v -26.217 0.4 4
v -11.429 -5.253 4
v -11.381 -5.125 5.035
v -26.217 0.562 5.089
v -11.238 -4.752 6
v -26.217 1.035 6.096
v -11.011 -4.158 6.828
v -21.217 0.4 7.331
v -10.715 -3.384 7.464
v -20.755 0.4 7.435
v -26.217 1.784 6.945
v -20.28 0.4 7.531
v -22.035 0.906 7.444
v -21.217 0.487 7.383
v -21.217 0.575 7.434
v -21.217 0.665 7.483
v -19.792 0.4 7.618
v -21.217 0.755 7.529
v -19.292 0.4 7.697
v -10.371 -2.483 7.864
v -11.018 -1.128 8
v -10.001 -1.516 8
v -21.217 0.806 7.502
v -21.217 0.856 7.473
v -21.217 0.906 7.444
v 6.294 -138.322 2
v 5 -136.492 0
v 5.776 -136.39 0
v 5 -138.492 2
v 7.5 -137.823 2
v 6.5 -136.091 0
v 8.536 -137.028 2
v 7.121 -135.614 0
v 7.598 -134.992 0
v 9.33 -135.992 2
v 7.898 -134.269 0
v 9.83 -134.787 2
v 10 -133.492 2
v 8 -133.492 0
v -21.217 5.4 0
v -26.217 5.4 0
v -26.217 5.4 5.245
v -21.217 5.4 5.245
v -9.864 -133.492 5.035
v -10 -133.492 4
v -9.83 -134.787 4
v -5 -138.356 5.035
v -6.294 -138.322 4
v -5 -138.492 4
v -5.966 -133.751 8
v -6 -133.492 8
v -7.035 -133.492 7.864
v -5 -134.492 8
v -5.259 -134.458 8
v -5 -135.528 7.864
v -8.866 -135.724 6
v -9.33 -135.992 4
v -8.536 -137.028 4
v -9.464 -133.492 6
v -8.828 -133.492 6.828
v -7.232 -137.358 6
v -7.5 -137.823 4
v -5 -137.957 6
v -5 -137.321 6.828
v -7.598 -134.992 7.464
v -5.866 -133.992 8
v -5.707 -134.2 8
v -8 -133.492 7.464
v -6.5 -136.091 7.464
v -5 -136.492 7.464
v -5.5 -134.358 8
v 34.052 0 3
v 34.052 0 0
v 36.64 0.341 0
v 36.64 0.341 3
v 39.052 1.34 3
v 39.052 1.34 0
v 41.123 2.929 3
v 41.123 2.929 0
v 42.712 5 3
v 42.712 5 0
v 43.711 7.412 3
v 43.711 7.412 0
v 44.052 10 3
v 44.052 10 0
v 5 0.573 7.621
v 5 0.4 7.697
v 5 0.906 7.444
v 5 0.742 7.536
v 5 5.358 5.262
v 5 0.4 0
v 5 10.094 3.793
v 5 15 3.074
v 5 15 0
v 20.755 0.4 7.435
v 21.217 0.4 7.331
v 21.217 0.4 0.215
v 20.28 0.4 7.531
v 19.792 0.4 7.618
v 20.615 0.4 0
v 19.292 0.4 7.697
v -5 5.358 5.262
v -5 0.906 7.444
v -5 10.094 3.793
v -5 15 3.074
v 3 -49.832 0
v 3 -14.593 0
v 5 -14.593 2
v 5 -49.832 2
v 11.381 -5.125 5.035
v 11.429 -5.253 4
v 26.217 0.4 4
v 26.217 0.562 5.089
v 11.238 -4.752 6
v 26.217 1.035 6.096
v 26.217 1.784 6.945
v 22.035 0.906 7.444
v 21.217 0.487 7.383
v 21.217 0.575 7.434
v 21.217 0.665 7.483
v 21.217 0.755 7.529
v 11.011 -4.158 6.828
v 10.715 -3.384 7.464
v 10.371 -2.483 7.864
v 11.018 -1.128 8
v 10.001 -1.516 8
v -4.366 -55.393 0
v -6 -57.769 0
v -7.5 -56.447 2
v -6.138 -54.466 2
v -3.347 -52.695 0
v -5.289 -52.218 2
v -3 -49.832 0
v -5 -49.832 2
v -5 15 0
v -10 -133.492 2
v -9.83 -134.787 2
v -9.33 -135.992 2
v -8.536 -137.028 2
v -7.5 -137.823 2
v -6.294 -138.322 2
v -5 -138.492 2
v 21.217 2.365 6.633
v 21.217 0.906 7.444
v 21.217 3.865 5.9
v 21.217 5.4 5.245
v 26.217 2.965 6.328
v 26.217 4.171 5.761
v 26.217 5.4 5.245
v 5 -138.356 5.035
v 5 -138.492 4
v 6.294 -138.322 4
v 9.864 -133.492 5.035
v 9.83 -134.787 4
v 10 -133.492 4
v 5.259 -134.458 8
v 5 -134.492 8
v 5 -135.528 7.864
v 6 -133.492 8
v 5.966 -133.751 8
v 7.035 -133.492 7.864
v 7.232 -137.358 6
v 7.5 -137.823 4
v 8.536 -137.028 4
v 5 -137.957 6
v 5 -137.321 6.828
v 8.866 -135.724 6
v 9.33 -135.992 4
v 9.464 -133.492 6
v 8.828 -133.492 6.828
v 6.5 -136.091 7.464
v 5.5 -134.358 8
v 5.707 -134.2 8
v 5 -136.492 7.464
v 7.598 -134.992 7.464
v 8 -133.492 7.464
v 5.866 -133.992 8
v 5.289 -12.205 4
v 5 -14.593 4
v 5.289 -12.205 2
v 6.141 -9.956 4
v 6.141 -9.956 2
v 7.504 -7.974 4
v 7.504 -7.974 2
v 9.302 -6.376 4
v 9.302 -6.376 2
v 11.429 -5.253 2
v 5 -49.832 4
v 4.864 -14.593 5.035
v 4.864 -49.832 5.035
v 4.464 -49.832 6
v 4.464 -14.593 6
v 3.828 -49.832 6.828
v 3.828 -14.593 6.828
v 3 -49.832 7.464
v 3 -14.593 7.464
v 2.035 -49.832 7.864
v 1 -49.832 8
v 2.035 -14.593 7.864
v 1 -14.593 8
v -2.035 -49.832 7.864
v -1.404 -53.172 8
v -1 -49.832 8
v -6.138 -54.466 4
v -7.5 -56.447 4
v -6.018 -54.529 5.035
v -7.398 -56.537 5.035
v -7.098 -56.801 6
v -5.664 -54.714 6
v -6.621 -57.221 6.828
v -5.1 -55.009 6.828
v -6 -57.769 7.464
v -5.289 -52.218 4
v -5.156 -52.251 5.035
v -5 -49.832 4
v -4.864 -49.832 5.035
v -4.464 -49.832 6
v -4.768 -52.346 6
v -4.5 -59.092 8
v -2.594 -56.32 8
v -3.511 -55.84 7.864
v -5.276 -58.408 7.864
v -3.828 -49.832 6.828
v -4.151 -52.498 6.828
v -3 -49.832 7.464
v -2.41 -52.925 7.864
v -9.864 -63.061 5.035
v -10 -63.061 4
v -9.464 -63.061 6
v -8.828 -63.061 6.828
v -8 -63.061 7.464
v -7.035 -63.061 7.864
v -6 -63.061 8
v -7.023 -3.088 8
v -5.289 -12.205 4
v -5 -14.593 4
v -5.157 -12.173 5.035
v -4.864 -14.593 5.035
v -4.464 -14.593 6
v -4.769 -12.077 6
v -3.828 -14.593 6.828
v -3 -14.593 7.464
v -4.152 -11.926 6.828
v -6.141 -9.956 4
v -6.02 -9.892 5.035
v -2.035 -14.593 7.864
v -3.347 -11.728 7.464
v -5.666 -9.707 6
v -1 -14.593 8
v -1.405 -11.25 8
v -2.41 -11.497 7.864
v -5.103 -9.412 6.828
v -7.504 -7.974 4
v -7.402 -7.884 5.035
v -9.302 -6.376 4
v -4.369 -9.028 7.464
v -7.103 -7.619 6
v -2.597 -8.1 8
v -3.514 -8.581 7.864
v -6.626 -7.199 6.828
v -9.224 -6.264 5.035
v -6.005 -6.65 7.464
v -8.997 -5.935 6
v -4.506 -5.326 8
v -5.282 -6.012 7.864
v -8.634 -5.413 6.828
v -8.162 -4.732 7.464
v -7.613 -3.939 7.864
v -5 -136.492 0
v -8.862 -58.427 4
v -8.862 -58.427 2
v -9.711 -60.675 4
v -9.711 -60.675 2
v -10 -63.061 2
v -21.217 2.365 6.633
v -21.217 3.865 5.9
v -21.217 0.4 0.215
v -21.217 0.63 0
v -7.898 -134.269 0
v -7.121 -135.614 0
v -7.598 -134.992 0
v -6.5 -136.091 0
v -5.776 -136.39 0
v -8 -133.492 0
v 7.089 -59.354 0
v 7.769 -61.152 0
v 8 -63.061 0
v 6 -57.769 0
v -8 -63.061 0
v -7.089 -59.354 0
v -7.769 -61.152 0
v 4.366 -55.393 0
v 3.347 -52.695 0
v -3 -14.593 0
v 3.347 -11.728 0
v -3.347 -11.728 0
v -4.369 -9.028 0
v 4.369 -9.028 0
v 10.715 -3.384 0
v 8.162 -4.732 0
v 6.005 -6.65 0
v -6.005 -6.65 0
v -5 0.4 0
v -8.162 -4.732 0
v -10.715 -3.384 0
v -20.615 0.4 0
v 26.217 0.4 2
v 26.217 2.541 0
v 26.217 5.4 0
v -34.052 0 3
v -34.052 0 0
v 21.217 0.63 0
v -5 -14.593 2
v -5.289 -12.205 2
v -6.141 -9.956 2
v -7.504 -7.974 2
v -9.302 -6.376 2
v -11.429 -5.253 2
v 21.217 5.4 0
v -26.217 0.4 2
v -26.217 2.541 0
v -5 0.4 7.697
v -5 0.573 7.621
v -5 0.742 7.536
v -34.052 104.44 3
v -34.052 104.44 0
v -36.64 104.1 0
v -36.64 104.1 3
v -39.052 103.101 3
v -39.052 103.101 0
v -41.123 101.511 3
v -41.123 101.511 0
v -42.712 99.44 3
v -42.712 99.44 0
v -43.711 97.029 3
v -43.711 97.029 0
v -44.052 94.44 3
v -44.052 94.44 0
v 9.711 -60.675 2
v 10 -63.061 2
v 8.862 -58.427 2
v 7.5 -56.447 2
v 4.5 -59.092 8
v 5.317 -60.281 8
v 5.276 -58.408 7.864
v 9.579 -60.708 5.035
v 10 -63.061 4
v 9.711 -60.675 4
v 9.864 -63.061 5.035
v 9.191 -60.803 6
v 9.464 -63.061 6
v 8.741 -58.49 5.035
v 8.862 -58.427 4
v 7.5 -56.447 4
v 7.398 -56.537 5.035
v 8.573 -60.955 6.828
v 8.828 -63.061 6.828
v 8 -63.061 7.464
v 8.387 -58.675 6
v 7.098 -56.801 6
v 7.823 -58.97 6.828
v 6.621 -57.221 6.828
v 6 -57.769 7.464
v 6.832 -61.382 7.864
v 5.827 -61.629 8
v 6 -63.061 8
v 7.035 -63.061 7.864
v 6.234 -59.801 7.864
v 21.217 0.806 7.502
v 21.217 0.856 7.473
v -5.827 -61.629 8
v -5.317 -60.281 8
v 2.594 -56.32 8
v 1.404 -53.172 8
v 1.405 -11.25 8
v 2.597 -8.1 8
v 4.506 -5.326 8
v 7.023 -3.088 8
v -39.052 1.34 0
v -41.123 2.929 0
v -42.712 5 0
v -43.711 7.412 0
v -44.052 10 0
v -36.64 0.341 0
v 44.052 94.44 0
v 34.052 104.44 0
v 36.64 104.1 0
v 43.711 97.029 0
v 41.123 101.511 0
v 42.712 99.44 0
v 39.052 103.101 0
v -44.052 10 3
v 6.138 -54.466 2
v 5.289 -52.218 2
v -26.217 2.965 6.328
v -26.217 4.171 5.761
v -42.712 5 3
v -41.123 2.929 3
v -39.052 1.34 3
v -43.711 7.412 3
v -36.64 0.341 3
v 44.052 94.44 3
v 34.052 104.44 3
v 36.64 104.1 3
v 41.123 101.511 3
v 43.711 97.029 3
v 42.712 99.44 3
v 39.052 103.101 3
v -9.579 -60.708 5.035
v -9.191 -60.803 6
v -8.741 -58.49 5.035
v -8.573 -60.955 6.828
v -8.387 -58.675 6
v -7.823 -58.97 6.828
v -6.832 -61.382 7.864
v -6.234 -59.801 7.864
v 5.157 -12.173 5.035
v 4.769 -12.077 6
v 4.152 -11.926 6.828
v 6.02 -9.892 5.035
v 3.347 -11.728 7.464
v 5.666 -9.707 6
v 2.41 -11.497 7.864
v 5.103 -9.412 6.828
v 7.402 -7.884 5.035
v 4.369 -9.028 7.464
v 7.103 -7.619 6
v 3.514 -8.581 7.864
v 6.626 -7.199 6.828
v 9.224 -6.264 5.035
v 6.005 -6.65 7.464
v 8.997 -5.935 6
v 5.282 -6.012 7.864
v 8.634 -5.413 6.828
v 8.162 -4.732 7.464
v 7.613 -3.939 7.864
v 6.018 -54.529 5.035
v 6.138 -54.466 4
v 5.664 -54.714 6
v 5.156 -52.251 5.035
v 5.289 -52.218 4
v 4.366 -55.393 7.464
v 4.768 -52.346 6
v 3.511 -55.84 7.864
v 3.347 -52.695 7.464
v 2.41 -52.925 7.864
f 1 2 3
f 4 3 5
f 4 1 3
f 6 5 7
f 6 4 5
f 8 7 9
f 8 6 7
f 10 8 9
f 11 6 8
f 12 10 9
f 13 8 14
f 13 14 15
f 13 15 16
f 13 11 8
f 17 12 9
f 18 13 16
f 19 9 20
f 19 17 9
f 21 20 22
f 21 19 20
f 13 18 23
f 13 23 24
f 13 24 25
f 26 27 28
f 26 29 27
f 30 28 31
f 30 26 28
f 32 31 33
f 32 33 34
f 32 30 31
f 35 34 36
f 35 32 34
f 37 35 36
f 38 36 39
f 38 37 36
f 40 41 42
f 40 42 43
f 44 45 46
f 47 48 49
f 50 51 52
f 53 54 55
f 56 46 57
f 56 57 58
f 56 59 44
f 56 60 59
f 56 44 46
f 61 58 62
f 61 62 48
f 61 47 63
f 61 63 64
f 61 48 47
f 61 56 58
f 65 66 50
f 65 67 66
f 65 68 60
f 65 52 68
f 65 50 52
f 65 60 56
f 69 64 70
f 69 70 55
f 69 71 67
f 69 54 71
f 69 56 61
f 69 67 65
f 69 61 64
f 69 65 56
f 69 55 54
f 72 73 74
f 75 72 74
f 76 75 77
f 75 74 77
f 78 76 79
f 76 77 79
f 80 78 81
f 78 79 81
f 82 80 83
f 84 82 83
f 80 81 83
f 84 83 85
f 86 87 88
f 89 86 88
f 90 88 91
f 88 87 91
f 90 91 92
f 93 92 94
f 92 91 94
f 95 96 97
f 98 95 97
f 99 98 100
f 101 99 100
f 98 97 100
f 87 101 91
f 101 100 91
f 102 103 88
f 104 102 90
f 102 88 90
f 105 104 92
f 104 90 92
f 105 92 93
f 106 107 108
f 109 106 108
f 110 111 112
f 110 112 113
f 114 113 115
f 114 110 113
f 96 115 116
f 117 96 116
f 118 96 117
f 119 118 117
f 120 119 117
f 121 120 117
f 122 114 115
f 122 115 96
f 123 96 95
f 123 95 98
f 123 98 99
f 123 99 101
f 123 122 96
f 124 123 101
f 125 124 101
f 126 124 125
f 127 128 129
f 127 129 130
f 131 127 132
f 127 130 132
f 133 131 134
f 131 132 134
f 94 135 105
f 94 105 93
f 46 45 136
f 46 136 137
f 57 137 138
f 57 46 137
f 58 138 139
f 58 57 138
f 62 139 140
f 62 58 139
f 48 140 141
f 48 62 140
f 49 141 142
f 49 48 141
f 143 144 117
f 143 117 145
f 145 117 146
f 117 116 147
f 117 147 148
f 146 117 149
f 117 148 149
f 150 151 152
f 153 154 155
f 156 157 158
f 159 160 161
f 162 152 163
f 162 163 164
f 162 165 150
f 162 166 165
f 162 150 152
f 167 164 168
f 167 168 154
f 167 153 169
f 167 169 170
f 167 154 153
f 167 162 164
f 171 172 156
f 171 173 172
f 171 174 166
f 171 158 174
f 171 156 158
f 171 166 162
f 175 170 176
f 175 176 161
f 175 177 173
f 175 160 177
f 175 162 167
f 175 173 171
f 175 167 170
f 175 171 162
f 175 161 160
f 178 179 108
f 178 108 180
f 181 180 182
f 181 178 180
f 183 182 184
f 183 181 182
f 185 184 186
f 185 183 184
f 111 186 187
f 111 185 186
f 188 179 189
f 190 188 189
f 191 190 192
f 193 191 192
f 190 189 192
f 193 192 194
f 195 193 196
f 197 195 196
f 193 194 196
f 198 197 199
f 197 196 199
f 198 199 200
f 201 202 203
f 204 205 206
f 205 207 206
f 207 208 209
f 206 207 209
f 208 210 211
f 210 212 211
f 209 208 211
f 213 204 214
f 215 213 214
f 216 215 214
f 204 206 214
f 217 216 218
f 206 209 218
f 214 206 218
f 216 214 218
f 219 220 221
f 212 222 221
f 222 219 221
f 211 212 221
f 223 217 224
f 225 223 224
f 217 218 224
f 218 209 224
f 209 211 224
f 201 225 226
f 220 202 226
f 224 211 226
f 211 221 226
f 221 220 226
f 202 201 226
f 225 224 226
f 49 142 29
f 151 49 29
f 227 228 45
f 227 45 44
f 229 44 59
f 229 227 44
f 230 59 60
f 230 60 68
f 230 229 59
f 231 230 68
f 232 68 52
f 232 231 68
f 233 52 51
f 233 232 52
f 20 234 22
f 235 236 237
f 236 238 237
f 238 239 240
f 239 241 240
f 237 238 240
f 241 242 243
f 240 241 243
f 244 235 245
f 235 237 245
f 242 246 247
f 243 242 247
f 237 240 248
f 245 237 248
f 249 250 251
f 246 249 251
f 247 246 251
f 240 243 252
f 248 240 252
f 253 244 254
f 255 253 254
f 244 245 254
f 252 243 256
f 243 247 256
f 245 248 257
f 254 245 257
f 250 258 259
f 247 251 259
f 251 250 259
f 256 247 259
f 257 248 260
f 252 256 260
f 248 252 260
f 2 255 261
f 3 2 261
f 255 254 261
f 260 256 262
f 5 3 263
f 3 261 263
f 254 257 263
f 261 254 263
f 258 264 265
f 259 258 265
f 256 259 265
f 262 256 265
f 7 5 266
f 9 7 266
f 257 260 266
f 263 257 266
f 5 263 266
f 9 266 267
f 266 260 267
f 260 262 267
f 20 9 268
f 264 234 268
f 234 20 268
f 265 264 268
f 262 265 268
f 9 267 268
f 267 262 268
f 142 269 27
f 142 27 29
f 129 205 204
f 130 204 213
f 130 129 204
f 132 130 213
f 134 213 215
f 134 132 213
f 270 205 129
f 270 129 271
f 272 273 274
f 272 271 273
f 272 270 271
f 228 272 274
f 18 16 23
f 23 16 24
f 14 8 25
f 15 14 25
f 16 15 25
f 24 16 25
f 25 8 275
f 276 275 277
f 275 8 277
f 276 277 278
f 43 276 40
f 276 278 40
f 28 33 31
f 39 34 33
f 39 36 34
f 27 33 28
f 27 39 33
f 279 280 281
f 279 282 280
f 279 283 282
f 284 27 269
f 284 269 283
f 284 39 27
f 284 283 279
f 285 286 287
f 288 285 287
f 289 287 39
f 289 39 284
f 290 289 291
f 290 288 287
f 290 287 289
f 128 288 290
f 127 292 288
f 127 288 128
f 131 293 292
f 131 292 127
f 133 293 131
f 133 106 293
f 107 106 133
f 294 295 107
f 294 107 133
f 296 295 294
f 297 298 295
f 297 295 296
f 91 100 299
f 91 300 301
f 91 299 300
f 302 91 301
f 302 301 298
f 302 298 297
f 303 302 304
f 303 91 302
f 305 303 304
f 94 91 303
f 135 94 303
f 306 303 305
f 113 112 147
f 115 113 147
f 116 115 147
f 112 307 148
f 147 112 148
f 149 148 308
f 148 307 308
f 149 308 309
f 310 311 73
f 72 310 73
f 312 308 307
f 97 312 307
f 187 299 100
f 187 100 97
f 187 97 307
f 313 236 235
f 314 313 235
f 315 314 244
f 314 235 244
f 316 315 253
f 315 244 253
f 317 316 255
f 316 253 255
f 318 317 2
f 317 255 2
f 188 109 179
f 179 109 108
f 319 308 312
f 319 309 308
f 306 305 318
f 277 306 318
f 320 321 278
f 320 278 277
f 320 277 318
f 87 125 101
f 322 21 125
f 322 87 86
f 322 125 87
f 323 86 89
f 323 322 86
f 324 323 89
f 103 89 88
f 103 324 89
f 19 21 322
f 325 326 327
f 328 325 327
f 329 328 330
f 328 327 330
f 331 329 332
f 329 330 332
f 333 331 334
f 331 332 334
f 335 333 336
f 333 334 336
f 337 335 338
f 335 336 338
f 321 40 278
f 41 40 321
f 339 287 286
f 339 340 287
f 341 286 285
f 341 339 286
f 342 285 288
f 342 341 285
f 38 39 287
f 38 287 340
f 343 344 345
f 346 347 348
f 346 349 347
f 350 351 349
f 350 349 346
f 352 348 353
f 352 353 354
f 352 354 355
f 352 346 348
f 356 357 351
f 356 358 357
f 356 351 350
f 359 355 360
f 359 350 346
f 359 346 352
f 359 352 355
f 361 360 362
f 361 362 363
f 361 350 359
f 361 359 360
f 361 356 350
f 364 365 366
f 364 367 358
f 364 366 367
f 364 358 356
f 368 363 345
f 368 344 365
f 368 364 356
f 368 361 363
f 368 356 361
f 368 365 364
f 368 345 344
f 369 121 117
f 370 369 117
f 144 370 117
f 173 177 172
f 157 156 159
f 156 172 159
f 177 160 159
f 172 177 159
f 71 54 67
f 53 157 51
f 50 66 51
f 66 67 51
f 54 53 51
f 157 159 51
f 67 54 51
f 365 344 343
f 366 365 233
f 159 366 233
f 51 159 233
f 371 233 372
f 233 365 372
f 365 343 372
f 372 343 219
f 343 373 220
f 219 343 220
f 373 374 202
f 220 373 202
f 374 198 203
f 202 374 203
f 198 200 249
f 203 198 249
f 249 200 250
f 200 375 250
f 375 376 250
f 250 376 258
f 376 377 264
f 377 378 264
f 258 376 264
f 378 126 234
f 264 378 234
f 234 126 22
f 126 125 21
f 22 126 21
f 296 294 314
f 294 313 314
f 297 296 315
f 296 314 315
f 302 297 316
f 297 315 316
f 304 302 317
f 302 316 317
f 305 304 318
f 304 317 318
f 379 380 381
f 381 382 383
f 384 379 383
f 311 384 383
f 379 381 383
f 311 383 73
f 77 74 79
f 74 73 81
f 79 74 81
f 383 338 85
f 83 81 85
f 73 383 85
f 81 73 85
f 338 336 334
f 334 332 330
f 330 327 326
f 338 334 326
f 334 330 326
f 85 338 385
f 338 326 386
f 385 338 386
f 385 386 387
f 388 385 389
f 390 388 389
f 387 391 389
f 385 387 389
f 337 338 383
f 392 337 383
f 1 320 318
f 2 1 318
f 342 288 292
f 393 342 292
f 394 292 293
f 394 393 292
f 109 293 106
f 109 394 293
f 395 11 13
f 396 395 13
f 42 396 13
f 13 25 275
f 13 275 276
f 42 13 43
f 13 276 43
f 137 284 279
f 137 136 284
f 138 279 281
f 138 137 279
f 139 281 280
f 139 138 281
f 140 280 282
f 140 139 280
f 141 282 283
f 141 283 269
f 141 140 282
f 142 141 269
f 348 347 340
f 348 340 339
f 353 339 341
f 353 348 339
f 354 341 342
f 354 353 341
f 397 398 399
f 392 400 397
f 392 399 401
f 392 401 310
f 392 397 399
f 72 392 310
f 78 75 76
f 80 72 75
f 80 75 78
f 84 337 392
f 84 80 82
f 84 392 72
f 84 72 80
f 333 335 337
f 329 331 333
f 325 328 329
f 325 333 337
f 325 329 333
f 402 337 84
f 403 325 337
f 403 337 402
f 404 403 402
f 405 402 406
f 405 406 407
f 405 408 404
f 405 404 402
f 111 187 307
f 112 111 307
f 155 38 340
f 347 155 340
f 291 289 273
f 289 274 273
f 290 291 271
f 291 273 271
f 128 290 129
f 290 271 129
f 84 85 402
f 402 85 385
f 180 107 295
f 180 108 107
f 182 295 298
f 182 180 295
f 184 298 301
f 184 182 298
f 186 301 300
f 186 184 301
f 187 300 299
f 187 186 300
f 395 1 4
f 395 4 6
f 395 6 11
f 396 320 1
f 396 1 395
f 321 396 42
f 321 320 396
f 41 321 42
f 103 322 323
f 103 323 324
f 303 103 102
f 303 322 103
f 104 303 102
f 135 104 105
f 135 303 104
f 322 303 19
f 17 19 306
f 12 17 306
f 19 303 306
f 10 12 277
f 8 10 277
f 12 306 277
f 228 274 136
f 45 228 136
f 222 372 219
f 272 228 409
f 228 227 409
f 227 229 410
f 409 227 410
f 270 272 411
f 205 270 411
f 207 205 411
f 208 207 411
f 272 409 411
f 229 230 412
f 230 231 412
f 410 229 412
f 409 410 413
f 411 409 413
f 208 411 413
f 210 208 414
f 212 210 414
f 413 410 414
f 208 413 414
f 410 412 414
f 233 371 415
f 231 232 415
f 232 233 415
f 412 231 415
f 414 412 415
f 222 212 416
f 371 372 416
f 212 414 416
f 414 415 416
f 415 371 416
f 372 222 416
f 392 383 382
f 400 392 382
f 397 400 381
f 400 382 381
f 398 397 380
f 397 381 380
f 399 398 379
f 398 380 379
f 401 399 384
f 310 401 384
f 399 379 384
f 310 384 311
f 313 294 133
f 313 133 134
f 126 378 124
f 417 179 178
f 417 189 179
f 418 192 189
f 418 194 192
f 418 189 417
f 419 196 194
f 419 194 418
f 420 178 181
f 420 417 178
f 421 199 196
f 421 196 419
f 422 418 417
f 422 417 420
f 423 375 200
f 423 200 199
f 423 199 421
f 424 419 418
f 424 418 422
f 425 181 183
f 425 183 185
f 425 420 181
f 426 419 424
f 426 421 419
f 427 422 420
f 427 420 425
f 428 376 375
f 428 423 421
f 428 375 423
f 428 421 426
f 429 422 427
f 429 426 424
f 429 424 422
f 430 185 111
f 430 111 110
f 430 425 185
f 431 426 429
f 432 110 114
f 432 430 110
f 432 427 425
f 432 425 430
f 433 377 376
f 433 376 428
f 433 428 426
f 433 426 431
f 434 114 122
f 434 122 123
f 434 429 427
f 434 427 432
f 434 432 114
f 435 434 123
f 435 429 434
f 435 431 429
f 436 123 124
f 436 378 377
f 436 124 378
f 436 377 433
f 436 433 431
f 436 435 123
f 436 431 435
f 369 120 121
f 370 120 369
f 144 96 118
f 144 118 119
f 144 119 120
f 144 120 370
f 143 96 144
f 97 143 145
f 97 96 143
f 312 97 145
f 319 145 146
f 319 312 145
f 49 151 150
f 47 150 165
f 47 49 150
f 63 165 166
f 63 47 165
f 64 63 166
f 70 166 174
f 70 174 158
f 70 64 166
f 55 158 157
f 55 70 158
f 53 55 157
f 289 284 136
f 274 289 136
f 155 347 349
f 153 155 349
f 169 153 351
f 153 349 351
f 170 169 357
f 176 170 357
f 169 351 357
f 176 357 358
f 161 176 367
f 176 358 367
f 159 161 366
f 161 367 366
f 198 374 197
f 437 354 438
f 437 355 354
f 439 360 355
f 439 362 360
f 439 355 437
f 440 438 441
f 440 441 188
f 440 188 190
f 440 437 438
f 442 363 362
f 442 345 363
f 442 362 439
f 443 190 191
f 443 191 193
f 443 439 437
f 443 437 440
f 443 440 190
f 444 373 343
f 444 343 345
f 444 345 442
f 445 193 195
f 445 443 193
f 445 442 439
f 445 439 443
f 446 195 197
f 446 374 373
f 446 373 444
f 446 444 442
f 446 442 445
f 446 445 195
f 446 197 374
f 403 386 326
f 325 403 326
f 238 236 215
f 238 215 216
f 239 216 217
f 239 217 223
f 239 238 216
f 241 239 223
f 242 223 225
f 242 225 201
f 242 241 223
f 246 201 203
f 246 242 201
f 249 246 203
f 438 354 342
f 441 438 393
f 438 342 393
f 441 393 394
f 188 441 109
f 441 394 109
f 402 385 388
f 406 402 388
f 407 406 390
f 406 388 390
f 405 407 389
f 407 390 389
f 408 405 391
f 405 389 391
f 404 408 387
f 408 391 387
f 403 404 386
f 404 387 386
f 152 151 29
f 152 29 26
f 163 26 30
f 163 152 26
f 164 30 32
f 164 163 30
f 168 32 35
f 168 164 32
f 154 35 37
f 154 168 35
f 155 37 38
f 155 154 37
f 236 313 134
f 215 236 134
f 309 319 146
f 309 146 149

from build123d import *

# Parameters (mm, degrees)
F2_DEPTH      = 3
F1_W          = 10
F1_H          = 50.7820645242
F1_H_2        = 8.1103595249
F1_H_3        = 14.6
F1_W_2        = 5
F1_H_4        = 5
F3_DEPTH      = 8
F4_T1_DEPTH   = 8
F5_R          = 10
F6_R          = 5
F7_R          = 10
F8_R          = 31.9895246327
F9_DEPTH      = 30
F9_DEPTH_BACK = 30
F10_T1_DEPTH  = 44.710583772
F10_T3_DEPTH  = 55.9785297761
F10_T5_DEPTH  = 44.710583772
F10_T7_DEPTH  = 35.23873089
F10_T9_DEPTH  = 70.4314974826
F10_T11_DEPTH = 10
F10_T14_ANGLE = 69.0798918948
F10_T16_ANGLE = 69.0798918948
F10_T18_ANGLE = 41.4096221077
F10_T20_ANGLE = 41.4096221088
F10_T22_ANGLE = 90
F10_T24_ANGLE = 90
F10_T26_ANGLE = 41.4096221088
F10_T28_ANGLE = 41.4096221077
F11_T1_DEPTH  = 70.4314974826
F11_T3_DEPTH  = 35.23873089
F11_T5_DEPTH  = 20.9741913293
F11_T7_DEPTH  = 10
F11_T9_DEPTH  = 20.9741913293
F11_T12_ANGLE = 69.0798918948
F11_T14_ANGLE = 41.4096221077
F11_T16_ANGLE = 41.4096221088
F11_T18_ANGLE = 90
F11_T20_ANGLE = 90
F11_T22_ANGLE = 41.4096221088
F11_T24_ANGLE = 41.4096221077
F11_T26_ANGLE = 69.0798918948


# Not quite as in the source:
# - a fillet or chamfer that OpenCascade refuses, or shapes differently, is made with other operations: its cross-section is extruded or revolved along the edge and cut away or added


with BuildPart() as f2:
    # F0 (on Top) → F2 (new body)
    with BuildSketch(Plane.XY):
        with BuildLine():
            Line((34.0520262078, 104.4403978414), (-34.0520262078, 104.4403978414))
            ThreePointArc((-34.0520262078, 104.4403978414), (-41.1230940197, 101.5114656532), (-44.0520262078, 94.4403978414))
            Line((-44.0520262078, 94.4403978414), (-44.0520262078, 10))
            ThreePointArc((-44.0520262078, 10), (-41.1230940197, 2.9289321881), (-34.0520262078, 0))
            Line((-34.0520262078, 0), (34.0520262078, 0))
            ThreePointArc((34.0520262078, 0), (41.1230940197, 2.9289321881), (44.0520262078, 10))
            Line((44.0520262078, 10), (44.0520262078, 94.4403978414))
            ThreePointArc((44.0520262078, 94.4403978414), (41.1230940197, 101.5114656532), (34.0520262078, 104.4403978414))
        make_face()
    extrude(amount=F2_DEPTH)


with BuildPart() as f3:
    # F1 (on Top) → F3 (new body)
    with BuildSketch(Plane.XY):
        Polygon((5, -58.4924240492), (-5, -58.4924240492), (-10, -58.4924240492), (-10, -138.4924240492), (10, -138.4924240492), (10, -58.4924240492), align=None)
        with Locations((0, -33.1013917871)):
            Rectangle(F1_W, F1_H)
        with Locations((0, -3.6551797625)):
            Rectangle(F1_W, F1_H_2)
        Polygon((-5, -7.7103595249), (-5, 0.4), (-21.2165865879, 0.4), (-26.2165865879, 0.4), align=None)
        Polygon((21.2165865879, 0.4), (5, 0.4), (5, -7.7103595249), (26.2165865879, 0.4), align=None)
        with Locations((0, 7.7)):
            Rectangle(F1_W, F1_H_3)
        with Locations((-23.7165865879, 2.9)):
            Rectangle(F1_W_2, F1_H_4)
        with Locations((23.7165865879, 2.9)):
            Rectangle(F1_W_2, F1_H_4)
    extrude(amount=F3_DEPTH)

    # F4: fillet of radius 10 on 2 edges, made by hand

    # F4_s2 → F4_t1 (join)
    with BuildSketch(Plane.XY):
        with BuildLine():
            ThreePointArc((-10, -58.4924240492), (-6.3397459622, -54.8321700113), (-5, -49.8321700113))
            Line((-5, -49.8321700113), (-5, -58.4924240492))
            Line((-5, -58.4924240492), (-10, -58.4924240492))
        make_face()
        with BuildLine():
            ThreePointArc((10, -58.4924240492), (6.3397459622, -54.8321700113), (5, -49.8321700113))
            Line((5, -49.8321700113), (5, -58.4924240492))
            Line((5, -58.4924240492), (10, -58.4924240492))
        make_face()
    extrude(amount=F4_T1_DEPTH)

    # F5
    f5_edges = [f3.edges().sort_by_distance(p)[0] for p in [
        (10, -58.492424, 4),
        (-10, -58.492424, 4),
    ]]
    fillet(f5_edges, radius=F5_R)

    # F6
    f6_edges = [f3.edges().sort_by_distance(p)[0] for p in [
        (-10, -138.492424, 4),
        (10, -138.492424, 4),
    ]]
    fillet(f6_edges, radius=F6_R)

    # F7
    f7_edges = [f3.edges().sort_by_distance(p)[0] for p in [
        (-5, -7.71036, 4),
        (5, -7.71036, 4),
    ]]
    fillet(f7_edges, radius=F7_R)

    # F8 (on Right) → F9 (cut, two sides)
    with BuildSketch(Plane.YZ) as f9_sk:
        with Locations((17.1725142692, 34.9895246327)):
            Circle(F8_R)
    extrude(amount=-F9_DEPTH, mode=Mode.SUBTRACT)
    extrude(f9_sk.sketch, amount=F9_DEPTH_BACK, mode=Mode.SUBTRACT)

    # F10: fillet of radius 4 on 16 edges, made by hand

    # F10_s2 → F10_t1 (cut)
    with BuildSketch(Plane(origin=(-49.9834696062, 19.1069334895, 0), x_dir=(0, 0, 1), z_dir=(0.9340792186, -0.3570658389, 0))):
        with BuildLine():
            ThreePointArc((4, 8.9874157949), (6.8284271247, 7.8158429197), (8, 4.9874157949))
            Line((8, 4.9874157949), (8, 8.9874157949))
            Line((8, 8.9874157949), (4, 8.9874157949))
        make_face()
    extrude(amount=F10_T1_DEPTH, mode=Mode.SUBTRACT)

    # F10_s4 → F10_t3 (cut)
    with BuildSketch(Plane.YZ.offset(-27.9892648881)):
        with BuildLine():
            ThreePointArc((-1.1276290725, 8), (-0.0733831244, 7.8585703934), (0.9063120288, 7.4442827405))
            ThreePointArc((0.9063120288, 7.4442827405), (0.4508473107, 7.7183761355), (0, 8))
            Line((0, 8), (-1.1276290725, 8))
        make_face()
    extrude(amount=F10_T3_DEPTH, mode=Mode.SUBTRACT)

    # F10_s6 → F10_t5 (cut)
    with BuildSketch(Plane(origin=(8.2202424512, 3.1423113885, 0), x_dir=(0, 0, 1), z_dir=(0.9340792186, 0.3570658389, 0))):
        with BuildLine():
            ThreePointArc((4, 8.9874157949), (6.8284271247, 7.8158429197), (8, 4.9874157949))
            Line((8, 4.9874157949), (8, 8.9874157949))
            Line((8, 8.9874157949), (4, 8.9874157949))
        make_face()
    extrude(amount=F10_T5_DEPTH, mode=Mode.SUBTRACT)

    # F10_s8 → F10_t7 (cut)
    with BuildSketch(Plane.XZ.offset(14.5934391213)):
        with BuildLine():
            ThreePointArc((5, 4), (3.8284271247, 6.8284271247), (1, 8))
            Line((1, 8), (5, 8))
            Line((5, 8), (5, 4))
        make_face()
        with BuildLine():
            ThreePointArc((-5, 4), (-3.8284271247, 6.8284271247), (-1, 8))
            Line((-1, 8), (-5, 8))
            Line((-5, 8), (-5, 4))
        make_face()
    extrude(amount=F10_T7_DEPTH, mode=Mode.SUBTRACT)

    # F10_s10 → F10_t9 (cut)
    with BuildSketch(Plane.XZ.offset(63.0609265666)):
        with BuildLine():
            ThreePointArc((10, 4), (8.8284271247, 6.8284271247), (6, 8))
            Line((6, 8), (10, 8))
            Line((10, 8), (10, 4))
        make_face()
        with BuildLine():
            ThreePointArc((-10, 4), (-8.8284271247, 6.8284271247), (-6, 8))
            Line((-6, 8), (-10, 8))
            Line((-10, 8), (-10, 4))
        make_face()
    extrude(amount=F10_T9_DEPTH, mode=Mode.SUBTRACT)

    # F10_s12 → F10_t11 (cut)
    with BuildSketch(Plane.YZ.offset(-5)):
        with BuildLine():
            ThreePointArc((-138.4924240492, 4), (-137.3208511739, 6.8284271247), (-134.4924240492, 8))
            Line((-134.4924240492, 8), (-138.4924240492, 8))
            Line((-138.4924240492, 8), (-138.4924240492, 4))
        make_face()
    extrude(amount=F10_T11_DEPTH, mode=Mode.SUBTRACT)

    # F10_s13 → F10_t14 (revolve, cut)
    with BuildSketch(Plane.XZ.offset(14.5934391213)):
        with BuildLine():
            ThreePointArc((-5, 4), (-3.8284271247, 6.8284271247), (-1, 8))
            Line((-1, 8), (-5, 8))
            Line((-5, 8), (-5, 4))
        make_face()
    revolve(axis=Axis((-15, -14.5934391213, 8), (0, 0, 1)), revolution_arc=F10_T14_ANGLE, mode=Mode.SUBTRACT)

    # F10_s15 → F10_t16 (revolve, cut)
    with BuildSketch(Plane.XZ.offset(14.5934391213)):
        with BuildLine():
            ThreePointArc((5, 4), (3.8284271247, 6.8284271247), (1, 8))
            Line((1, 8), (5, 8))
            Line((5, 8), (5, 4))
        make_face()
    revolve(axis=Axis((15, -14.5934391213, 8), (0, 0, -1)), revolution_arc=F10_T16_ANGLE, mode=Mode.SUBTRACT)

    # F10_s17 → F10_t18 (revolve, cut)
    with BuildSketch(Plane(origin=(31.2831617138, -35.4717711942, 0), x_dir=(0, 0, 1), z_dir=(0.6614378278, -0.75, 0))):
        with BuildLine():
            ThreePointArc((4, 31.7108822847), (6.8284271247, 32.88245516), (8, 35.7108822847))
            Line((8, 35.7108822847), (8, 31.7108822847))
            Line((8, 31.7108822847), (4, 31.7108822847))
        make_face()
    revolve(axis=Axis((15.0000000004, -49.8321700111, 8), (0, 0, -1)), revolution_arc=F10_T18_ANGLE, mode=Mode.SUBTRACT)

    # F10_s19 → F10_t20 (revolve, cut)
    with BuildSketch(Plane.XZ.offset(63.0609265666)):
        with BuildLine():
            ThreePointArc((10, 4), (8.8284271247, 6.8284271247), (6, 8))
            Line((6, 8), (10, 8))
            Line((10, 8), (10, 4))
        make_face()
    revolve(axis=Axis((0, -63.0609265666, 8), (0, 0, 1)), revolution_arc=F10_T20_ANGLE, mode=Mode.SUBTRACT)

    # F10_s21 → F10_t22 (revolve, cut)
    with BuildSketch(Plane.YZ.offset(5)):
        with BuildLine():
            ThreePointArc((-138.4924240492, 4), (-137.3208511739, 6.8284271247), (-134.4924240492, 8))
            Line((-134.4924240492, 8), (-138.4924240492, 8))
            Line((-138.4924240492, 8), (-138.4924240492, 4))
        make_face()
    revolve(axis=Axis((5, -133.4924240492, 8), (0, 0, 1)), revolution_arc=F10_T22_ANGLE, mode=Mode.SUBTRACT)

    # F10_s23 → F10_t24 (revolve, cut)
    with BuildSketch(Plane.XZ.offset(133.4924240492)):
        with BuildLine():
            ThreePointArc((-10, 4), (-8.8284271247, 6.8284271247), (-6, 8))
            Line((-6, 8), (-10, 8))
            Line((-10, 8), (-10, 4))
        make_face()
    revolve(axis=Axis((-5, -133.4924240492, 8), (0, 0, 1)), revolution_arc=F10_T24_ANGLE, mode=Mode.SUBTRACT)

    # F10_s25 → F10_t26 (revolve, cut)
    with BuildSketch(Plane.XZ.offset(63.0609265666)):
        with BuildLine():
            ThreePointArc((-10, 4), (-8.8284271247, 6.8284271247), (-6, 8))
            Line((-6, 8), (-10, 8))
            Line((-10, 8), (-10, 4))
        make_face()
    revolve(axis=Axis((0, -63.0609265666, 8), (0, 0, -1)), revolution_arc=F10_T26_ANGLE, mode=Mode.SUBTRACT)

    # F10_s27 → F10_t28 (revolve, cut)
    with BuildSketch(Plane(origin=(-31.2831617138, -35.4717711942, 0), x_dir=(0, 0, 1), z_dir=(-0.6614378278, -0.75, 0))):
        with BuildLine():
            ThreePointArc((4, -31.7108822847), (6.8284271247, -32.88245516), (8, -35.7108822847))
            Line((8, -35.7108822847), (8, -31.7108822847))
            Line((8, -31.7108822847), (4, -31.7108822847))
        make_face()
    revolve(axis=Axis((-15.0000000004, -49.8321700111, 8), (0, 0, 1)), revolution_arc=F10_T28_ANGLE, mode=Mode.SUBTRACT)

    # F11: chamfer of 2 on 15 edges, made by hand

    # F11_s2 → F11_t1 (cut)
    with BuildSketch(Plane.XZ.offset(63.0609265666)):
        Polygon((-8, 0), (-10, 2), (-10, 0), align=None)
        Polygon((8, 0), (10, 2), (10, 0), align=None)
    extrude(amount=F11_T1_DEPTH, mode=Mode.SUBTRACT)

    # F11_s4 → F11_t3 (cut)
    with BuildSketch(Plane.XZ.offset(14.5934391213)):
        Polygon((-3, 0), (-5, 2), (-5, 0), align=None)
        Polygon((3, 0), (5, 2), (5, 0), align=None)
    extrude(amount=F11_T3_DEPTH, mode=Mode.SUBTRACT)

    # F11_s6 → F11_t5 (cut)
    with BuildSketch(Plane(origin=(-27.8117986999, 10.6314786102, 0), x_dir=(0, 0, 1), z_dir=(0.9340792186, -0.3570658389, 0))):
        Polygon((0, 6.9874157949), (2, 8.9874157949), (0, 8.9874157949), align=None)
    extrude(amount=F11_T5_DEPTH, mode=Mode.SUBTRACT)

    # F11_s8 → F11_t7 (cut)
    with BuildSketch(Plane.YZ.offset(-5)):
        Polygon((-136.4924240492, 0), (-138.4924240492, 2), (-138.4924240492, 0), align=None)
    extrude(amount=F11_T7_DEPTH, mode=Mode.SUBTRACT)

    # F11_s10 → F11_t9 (cut)
    with BuildSketch(Plane(origin=(8.2202424512, 3.1423113885, 0), x_dir=(0, 0, 1), z_dir=(0.9340792186, 0.3570658389, 0))):
        Polygon((0, 6.9874157949), (2, 8.9874157949), (0, 8.9874157949), align=None)
    extrude(amount=F11_T9_DEPTH, mode=Mode.SUBTRACT)

    # F11_s11 → F11_t12 (revolve, cut)
    with BuildSketch(Plane.XZ.offset(14.5934391213)):
        Polygon((-3, 0), (-5, 2), (-5, 0), align=None)
    revolve(axis=Axis((-15, -14.5934391213, 0), (0, 0, 1)), revolution_arc=F11_T12_ANGLE, mode=Mode.SUBTRACT)

    # F11_s13 → F11_t14 (revolve, cut)
    with BuildSketch(Plane(origin=(-31.2831617138, -35.4717711942, 0), x_dir=(0, 0, 1), z_dir=(-0.6614378278, -0.75, 0))):
        Polygon((0, -33.7108822847), (2, -31.7108822847), (0, -31.7108822847), align=None)
    revolve(axis=Axis((-15.0000000004, -49.8321700111, 0), (0, 0, 1)), revolution_arc=F11_T14_ANGLE, mode=Mode.SUBTRACT)

    # F11_s15 → F11_t16 (revolve, cut)
    with BuildSketch(Plane.XZ.offset(63.0609265666)):
        Polygon((-8, 0), (-10, 2), (-10, 0), align=None)
    revolve(axis=Axis((0, -63.0609265666, 0), (0, 0, -1)), revolution_arc=F11_T16_ANGLE, mode=Mode.SUBTRACT)

    # F11_s17 → F11_t18 (revolve, cut)
    with BuildSketch(Plane.XZ.offset(133.4924240492)):
        Polygon((-8, 0), (-10, 2), (-10, 0), align=None)
    revolve(axis=Axis((-5, -133.4924240492, 0), (0, 0, 1)), revolution_arc=F11_T18_ANGLE, mode=Mode.SUBTRACT)

    # F11_s19 → F11_t20 (revolve, cut)
    with BuildSketch(Plane.YZ.offset(5)):
        Polygon((-136.4924240492, 0), (-138.4924240492, 2), (-138.4924240492, 0), align=None)
    revolve(axis=Axis((5, -133.4924240492, 0), (0, 0, 1)), revolution_arc=F11_T20_ANGLE, mode=Mode.SUBTRACT)

    # F11_s21 → F11_t22 (revolve, cut)
    with BuildSketch(Plane.XZ.offset(63.0609265666)):
        Polygon((8, 0), (10, 2), (10, 0), align=None)
    revolve(axis=Axis((0, -63.0609265666, 0), (0, 0, 1)), revolution_arc=F11_T22_ANGLE, mode=Mode.SUBTRACT)

    # F11_s23 → F11_t24 (revolve, cut)
    with BuildSketch(Plane(origin=(31.2831617138, -35.4717711942, 0), x_dir=(0, 0, 1), z_dir=(0.6614378278, -0.75, 0))):
        Polygon((0, 33.7108822847), (2, 31.7108822847), (0, 31.7108822847), align=None)
    revolve(axis=Axis((15.0000000004, -49.8321700111, 0), (0, 0, -1)), revolution_arc=F11_T24_ANGLE, mode=Mode.SUBTRACT)

    # F11_s25 → F11_t26 (revolve, cut)
    with BuildSketch(Plane.XZ.offset(14.5934391213)):
        Polygon((3, 0), (5, 2), (5, 0), align=None)
    revolve(axis=Axis((15, -14.5934391213, 0), (0, 0, -1)), revolution_arc=F11_T26_ANGLE, mode=Mode.SUBTRACT)


solid = Compound([f2.part, f3.part])
